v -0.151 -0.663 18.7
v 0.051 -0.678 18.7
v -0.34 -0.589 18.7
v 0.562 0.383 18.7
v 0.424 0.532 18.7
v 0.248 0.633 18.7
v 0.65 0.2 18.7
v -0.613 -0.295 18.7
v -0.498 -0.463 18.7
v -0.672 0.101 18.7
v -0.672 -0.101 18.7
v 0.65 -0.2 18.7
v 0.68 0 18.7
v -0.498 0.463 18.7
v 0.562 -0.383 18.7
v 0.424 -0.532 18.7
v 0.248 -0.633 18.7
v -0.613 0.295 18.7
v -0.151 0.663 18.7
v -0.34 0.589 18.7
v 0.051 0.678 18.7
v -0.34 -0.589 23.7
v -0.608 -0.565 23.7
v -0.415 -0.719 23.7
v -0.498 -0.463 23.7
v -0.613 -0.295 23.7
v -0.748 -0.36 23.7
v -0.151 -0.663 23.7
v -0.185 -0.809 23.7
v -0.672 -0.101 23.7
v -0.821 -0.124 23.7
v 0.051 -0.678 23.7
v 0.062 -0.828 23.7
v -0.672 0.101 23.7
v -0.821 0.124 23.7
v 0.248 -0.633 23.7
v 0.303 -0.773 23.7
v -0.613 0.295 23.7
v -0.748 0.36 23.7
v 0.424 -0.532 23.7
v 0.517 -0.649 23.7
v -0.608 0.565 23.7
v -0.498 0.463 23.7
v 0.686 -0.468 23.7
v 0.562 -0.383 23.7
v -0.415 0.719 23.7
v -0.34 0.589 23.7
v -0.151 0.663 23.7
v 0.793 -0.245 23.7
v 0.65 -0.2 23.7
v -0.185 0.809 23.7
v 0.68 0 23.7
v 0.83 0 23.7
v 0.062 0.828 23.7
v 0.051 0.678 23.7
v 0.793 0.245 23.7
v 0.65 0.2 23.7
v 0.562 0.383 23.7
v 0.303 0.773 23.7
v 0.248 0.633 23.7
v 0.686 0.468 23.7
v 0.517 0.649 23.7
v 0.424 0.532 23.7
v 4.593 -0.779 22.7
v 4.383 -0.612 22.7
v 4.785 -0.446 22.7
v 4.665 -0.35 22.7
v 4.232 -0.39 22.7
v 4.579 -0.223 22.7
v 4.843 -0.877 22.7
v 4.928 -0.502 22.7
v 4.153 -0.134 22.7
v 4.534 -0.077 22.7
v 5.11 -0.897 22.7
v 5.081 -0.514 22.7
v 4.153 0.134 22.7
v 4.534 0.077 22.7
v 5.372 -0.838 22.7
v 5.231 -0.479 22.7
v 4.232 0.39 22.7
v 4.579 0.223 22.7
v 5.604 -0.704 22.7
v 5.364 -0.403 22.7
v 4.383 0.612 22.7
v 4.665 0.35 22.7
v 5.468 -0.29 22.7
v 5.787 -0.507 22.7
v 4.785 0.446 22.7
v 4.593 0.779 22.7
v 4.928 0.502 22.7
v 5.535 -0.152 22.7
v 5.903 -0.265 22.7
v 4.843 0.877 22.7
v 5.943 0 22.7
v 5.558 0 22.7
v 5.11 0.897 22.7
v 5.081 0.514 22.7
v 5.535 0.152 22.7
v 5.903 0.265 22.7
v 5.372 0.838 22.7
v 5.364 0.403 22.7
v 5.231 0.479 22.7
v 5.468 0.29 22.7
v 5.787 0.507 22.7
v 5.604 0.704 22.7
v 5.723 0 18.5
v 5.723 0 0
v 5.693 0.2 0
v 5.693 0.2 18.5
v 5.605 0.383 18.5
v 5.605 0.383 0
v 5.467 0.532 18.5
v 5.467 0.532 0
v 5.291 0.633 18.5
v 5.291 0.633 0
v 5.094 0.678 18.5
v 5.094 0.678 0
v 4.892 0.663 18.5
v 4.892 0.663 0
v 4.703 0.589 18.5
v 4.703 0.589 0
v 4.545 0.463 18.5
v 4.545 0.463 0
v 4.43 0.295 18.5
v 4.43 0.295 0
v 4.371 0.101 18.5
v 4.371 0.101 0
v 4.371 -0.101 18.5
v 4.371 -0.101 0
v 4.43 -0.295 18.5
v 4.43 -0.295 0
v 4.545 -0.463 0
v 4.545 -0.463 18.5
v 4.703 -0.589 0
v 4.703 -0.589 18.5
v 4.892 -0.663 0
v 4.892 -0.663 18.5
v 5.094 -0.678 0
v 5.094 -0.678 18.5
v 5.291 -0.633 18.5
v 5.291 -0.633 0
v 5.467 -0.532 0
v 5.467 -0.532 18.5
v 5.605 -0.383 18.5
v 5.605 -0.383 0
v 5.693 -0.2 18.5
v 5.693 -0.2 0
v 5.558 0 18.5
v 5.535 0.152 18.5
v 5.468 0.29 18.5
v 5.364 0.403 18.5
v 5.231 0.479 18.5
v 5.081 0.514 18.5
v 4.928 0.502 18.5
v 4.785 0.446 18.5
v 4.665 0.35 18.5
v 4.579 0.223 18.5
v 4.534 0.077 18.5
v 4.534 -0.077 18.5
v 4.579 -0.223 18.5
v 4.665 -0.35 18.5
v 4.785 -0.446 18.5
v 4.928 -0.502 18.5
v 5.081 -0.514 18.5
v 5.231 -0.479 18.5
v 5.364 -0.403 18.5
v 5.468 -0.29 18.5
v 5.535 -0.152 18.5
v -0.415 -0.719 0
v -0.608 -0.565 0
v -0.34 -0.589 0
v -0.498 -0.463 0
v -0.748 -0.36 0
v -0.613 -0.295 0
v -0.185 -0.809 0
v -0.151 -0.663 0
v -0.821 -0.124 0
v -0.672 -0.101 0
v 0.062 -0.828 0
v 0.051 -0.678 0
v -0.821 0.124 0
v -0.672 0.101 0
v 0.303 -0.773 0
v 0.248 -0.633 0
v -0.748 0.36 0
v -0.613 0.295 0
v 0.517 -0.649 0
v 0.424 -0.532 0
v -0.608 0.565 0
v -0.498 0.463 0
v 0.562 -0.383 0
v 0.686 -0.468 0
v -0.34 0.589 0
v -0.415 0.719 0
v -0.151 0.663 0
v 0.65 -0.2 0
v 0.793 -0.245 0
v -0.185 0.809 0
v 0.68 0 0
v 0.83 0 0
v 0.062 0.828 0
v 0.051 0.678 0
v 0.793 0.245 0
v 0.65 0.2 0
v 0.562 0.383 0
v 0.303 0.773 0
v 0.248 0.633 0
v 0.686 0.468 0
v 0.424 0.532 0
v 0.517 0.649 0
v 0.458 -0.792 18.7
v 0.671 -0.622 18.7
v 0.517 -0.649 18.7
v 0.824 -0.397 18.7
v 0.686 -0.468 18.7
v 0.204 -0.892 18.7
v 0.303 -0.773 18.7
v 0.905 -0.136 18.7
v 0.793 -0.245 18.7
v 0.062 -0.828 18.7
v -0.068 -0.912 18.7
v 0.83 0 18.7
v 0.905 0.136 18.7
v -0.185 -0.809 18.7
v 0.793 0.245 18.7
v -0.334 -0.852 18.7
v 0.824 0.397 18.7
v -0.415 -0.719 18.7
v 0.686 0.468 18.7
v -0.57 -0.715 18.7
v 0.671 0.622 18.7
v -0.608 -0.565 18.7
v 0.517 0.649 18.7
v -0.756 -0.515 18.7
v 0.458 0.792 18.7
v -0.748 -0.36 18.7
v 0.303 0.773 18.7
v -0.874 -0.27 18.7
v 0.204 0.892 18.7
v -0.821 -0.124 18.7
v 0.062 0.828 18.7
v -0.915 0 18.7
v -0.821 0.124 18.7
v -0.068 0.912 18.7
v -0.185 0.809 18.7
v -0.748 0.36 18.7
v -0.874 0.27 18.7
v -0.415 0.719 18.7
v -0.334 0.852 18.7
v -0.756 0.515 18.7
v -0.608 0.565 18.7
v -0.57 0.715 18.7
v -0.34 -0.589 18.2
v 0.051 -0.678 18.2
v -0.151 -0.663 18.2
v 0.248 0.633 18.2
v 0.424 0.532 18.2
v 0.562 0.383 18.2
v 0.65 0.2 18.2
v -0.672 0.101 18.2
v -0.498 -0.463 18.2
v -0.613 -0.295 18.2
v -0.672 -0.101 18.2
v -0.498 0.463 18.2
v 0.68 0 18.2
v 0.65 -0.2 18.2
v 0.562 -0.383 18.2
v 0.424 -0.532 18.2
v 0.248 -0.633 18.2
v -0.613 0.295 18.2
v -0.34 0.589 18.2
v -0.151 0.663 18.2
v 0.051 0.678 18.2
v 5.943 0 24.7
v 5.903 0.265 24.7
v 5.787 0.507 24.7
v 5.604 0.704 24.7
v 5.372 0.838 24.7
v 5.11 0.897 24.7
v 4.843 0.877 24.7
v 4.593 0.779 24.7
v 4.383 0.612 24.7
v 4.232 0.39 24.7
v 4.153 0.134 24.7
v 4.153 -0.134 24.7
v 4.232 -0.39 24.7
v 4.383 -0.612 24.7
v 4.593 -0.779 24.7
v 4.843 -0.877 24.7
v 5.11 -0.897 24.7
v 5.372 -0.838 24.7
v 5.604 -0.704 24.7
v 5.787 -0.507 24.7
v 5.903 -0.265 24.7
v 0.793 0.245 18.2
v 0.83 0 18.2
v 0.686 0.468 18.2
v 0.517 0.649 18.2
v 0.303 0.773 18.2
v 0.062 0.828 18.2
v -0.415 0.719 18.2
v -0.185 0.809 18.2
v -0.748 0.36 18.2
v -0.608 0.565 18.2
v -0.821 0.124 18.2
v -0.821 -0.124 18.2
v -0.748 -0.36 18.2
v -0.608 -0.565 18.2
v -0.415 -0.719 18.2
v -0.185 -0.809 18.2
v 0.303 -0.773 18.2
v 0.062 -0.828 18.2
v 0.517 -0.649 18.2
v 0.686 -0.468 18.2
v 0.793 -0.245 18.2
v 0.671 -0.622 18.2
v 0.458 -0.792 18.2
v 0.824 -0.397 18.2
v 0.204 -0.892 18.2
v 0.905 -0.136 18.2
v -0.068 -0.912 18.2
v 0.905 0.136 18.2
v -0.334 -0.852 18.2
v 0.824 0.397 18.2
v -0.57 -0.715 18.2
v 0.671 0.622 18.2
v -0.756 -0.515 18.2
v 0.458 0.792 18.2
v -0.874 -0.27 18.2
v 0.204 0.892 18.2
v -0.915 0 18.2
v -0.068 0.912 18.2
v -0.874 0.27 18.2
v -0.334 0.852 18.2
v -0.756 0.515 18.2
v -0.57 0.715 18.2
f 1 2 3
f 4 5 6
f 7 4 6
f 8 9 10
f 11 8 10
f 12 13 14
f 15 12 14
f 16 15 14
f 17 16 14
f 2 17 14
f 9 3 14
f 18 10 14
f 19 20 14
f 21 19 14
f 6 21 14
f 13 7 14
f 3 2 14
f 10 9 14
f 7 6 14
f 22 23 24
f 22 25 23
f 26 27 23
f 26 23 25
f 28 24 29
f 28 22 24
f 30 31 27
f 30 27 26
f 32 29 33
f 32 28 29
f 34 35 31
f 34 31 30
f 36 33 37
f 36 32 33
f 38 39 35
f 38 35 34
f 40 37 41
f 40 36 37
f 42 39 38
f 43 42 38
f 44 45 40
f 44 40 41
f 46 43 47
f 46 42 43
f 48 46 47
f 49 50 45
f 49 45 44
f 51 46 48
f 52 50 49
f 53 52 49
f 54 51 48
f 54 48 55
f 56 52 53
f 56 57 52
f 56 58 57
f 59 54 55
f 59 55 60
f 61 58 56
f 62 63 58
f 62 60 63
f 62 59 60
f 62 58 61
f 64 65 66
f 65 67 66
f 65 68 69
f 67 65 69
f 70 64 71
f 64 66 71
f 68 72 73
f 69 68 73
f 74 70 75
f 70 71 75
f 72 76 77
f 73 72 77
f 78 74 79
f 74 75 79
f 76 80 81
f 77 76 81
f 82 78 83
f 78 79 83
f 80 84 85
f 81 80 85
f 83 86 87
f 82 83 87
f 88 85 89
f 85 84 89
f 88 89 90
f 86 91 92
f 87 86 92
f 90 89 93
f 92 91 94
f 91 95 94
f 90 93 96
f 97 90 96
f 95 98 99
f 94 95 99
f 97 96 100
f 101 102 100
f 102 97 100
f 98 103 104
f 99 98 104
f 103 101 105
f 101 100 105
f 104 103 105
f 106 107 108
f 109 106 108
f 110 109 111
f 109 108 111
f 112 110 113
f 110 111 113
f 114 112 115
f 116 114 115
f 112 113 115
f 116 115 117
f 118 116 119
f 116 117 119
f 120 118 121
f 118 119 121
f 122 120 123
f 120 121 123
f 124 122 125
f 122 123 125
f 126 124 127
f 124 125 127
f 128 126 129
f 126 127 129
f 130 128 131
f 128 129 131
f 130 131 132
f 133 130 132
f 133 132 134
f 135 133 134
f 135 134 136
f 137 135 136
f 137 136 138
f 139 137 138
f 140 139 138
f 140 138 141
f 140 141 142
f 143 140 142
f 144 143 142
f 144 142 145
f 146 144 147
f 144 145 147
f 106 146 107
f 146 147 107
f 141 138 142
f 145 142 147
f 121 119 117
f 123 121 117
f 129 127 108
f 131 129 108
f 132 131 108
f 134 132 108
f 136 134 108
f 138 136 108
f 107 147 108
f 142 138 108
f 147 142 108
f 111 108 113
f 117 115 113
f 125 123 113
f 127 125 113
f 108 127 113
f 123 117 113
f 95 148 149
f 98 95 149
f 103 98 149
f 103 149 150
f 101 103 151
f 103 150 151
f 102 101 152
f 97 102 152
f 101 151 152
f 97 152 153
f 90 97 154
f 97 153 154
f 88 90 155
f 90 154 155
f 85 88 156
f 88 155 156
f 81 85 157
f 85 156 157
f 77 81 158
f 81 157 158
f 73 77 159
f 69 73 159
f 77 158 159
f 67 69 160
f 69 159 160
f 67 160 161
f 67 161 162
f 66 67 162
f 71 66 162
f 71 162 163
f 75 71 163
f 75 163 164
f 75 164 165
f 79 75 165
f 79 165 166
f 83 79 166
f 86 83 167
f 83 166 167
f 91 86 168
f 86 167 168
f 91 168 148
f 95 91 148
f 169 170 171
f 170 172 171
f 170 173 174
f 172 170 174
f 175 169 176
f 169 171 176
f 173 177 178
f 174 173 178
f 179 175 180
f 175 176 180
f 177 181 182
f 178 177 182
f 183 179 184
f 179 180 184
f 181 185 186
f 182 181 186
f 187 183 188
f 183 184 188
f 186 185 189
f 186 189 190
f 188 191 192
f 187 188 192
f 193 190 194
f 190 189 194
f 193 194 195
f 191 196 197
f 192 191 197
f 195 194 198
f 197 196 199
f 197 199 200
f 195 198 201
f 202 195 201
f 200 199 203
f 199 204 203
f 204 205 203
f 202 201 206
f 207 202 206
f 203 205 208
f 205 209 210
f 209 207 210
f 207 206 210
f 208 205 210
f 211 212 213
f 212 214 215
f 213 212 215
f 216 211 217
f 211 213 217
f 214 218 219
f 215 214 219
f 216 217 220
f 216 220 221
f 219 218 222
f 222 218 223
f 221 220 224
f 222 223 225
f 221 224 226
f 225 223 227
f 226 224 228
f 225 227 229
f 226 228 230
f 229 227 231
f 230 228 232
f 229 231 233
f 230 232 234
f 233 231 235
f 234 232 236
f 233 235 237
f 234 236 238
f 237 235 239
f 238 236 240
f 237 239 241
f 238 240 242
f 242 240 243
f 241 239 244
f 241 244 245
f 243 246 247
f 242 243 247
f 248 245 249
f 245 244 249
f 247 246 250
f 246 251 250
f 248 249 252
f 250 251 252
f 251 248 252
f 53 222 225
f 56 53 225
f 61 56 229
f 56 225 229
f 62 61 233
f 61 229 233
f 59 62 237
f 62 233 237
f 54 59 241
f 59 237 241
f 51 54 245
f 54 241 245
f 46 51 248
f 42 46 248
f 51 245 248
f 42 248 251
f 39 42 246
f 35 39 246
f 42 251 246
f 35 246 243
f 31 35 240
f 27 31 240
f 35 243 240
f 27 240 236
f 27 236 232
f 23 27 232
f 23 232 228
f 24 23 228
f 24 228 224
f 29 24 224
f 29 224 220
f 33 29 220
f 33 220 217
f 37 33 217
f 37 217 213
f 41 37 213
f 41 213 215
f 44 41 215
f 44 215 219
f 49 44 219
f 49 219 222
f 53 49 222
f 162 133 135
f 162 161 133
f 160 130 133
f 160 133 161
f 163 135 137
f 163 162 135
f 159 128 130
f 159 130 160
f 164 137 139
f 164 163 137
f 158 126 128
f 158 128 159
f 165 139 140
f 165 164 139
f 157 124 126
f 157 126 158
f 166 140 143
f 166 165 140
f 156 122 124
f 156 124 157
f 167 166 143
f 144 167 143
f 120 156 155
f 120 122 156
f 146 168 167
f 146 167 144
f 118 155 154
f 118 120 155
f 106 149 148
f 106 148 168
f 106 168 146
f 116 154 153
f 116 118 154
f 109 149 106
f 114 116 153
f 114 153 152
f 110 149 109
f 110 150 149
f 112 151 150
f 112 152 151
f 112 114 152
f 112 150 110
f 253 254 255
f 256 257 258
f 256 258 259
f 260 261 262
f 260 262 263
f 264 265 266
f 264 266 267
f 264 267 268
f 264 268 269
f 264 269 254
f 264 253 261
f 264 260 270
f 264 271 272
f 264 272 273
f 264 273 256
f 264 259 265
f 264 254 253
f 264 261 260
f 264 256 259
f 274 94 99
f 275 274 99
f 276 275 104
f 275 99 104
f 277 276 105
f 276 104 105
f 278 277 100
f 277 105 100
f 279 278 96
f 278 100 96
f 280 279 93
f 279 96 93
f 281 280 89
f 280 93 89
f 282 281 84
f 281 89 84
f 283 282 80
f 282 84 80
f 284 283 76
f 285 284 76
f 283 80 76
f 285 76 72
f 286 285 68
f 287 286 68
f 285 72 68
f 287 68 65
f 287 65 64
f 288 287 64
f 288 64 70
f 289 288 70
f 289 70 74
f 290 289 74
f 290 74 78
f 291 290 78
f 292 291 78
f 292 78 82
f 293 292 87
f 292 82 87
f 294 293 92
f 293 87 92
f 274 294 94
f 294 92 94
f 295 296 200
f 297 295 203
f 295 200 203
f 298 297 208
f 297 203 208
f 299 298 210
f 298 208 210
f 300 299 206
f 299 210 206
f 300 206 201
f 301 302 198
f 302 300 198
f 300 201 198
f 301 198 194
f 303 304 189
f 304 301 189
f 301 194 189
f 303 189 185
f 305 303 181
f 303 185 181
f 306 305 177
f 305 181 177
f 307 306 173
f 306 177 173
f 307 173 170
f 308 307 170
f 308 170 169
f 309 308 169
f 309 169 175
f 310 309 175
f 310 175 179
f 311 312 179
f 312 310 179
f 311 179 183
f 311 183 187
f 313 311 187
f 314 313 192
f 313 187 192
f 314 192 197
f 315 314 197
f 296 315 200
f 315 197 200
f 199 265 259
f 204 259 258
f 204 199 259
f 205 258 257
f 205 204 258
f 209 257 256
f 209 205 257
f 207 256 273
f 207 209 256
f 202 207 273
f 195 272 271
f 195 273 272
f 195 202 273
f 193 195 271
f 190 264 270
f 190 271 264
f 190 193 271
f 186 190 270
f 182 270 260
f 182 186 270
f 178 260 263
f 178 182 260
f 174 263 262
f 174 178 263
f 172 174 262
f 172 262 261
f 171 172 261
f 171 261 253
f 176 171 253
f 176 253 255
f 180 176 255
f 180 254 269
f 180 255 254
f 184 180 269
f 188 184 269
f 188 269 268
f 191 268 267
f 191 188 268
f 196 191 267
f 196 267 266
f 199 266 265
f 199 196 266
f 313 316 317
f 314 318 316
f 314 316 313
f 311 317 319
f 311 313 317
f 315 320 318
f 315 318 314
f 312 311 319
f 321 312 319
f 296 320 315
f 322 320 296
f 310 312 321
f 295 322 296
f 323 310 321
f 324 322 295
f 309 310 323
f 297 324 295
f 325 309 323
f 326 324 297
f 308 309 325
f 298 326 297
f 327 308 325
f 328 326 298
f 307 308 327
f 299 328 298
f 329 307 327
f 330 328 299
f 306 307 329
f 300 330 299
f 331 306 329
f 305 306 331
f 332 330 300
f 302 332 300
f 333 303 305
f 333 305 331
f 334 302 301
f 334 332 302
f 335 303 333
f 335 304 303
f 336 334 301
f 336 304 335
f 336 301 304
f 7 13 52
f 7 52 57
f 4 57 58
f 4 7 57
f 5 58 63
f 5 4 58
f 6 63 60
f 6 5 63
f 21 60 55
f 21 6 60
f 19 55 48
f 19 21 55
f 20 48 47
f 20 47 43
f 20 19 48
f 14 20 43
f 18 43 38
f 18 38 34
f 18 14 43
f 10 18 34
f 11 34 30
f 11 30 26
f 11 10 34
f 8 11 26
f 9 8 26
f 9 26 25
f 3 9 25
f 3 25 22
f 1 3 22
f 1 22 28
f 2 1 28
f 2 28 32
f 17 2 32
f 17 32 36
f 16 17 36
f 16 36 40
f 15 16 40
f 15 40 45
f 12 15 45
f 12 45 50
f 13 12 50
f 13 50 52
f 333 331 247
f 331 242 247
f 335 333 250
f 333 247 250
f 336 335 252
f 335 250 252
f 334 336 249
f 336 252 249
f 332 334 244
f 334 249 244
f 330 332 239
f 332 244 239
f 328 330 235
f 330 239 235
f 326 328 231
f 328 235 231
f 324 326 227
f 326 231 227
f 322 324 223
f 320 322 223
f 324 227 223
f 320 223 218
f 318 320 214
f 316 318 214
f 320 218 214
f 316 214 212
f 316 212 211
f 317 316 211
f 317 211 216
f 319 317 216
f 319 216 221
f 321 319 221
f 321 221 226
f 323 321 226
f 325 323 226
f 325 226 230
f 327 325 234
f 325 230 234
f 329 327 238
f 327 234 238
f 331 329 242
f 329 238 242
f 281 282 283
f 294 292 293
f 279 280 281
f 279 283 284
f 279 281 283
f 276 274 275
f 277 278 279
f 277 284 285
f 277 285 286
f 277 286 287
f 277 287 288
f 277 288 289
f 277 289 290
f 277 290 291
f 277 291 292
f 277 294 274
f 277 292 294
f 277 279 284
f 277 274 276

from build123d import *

# Parameters (mm, degrees)
F0_R     = 0.83
F0_R_2   = 0.68
F1_DEPTH = 23.7
F2_R     = 0.68
F3_DEPTH = 18.5
F4_R     = 0.515
F5_DEPTH = 4.2
F6_R     = 0.9
F7_DEPTH = 2
F8_W     = 0.915
F8_H     = 0.5


with BuildPart() as f1:
    # F0 (on Top) → F1 (new body)
    with BuildSketch(Plane.XY):
        Circle(F0_R)
        Circle(F0_R_2, mode=Mode.SUBTRACT)
    extrude(amount=F1_DEPTH)

    # F8 (on Front) → F9 (revolve)
    with BuildSketch(Plane.XZ):
        with Locations((-0.4575, 18.45)):
            Rectangle(F8_W, F8_H)
    revolve(axis=Axis((0, 0, 18.45), (0, 0, -1)))


with BuildPart() as f3:
    # F2 (on Top) → F3 (new body)
    with BuildSketch(Plane.XY):
        with Locations((5.042982, 0)):
            Circle(F2_R)
    extrude(amount=F3_DEPTH)

    # F4 (on face) → F5 (join)
    with BuildSketch(Plane.XY.offset(18.5)):
        with Locations((5.042982, 0)):
            Circle(F4_R)
    extrude(amount=F5_DEPTH)

    # F6 (on face) → F7 (join)
    with BuildSketch(Plane.XY.offset(22.7)):
        with Locations((5.042982, 0)):
            Circle(F6_R)
    extrude(amount=F7_DEPTH)


solid = Compound([f1.part, f3.part])
